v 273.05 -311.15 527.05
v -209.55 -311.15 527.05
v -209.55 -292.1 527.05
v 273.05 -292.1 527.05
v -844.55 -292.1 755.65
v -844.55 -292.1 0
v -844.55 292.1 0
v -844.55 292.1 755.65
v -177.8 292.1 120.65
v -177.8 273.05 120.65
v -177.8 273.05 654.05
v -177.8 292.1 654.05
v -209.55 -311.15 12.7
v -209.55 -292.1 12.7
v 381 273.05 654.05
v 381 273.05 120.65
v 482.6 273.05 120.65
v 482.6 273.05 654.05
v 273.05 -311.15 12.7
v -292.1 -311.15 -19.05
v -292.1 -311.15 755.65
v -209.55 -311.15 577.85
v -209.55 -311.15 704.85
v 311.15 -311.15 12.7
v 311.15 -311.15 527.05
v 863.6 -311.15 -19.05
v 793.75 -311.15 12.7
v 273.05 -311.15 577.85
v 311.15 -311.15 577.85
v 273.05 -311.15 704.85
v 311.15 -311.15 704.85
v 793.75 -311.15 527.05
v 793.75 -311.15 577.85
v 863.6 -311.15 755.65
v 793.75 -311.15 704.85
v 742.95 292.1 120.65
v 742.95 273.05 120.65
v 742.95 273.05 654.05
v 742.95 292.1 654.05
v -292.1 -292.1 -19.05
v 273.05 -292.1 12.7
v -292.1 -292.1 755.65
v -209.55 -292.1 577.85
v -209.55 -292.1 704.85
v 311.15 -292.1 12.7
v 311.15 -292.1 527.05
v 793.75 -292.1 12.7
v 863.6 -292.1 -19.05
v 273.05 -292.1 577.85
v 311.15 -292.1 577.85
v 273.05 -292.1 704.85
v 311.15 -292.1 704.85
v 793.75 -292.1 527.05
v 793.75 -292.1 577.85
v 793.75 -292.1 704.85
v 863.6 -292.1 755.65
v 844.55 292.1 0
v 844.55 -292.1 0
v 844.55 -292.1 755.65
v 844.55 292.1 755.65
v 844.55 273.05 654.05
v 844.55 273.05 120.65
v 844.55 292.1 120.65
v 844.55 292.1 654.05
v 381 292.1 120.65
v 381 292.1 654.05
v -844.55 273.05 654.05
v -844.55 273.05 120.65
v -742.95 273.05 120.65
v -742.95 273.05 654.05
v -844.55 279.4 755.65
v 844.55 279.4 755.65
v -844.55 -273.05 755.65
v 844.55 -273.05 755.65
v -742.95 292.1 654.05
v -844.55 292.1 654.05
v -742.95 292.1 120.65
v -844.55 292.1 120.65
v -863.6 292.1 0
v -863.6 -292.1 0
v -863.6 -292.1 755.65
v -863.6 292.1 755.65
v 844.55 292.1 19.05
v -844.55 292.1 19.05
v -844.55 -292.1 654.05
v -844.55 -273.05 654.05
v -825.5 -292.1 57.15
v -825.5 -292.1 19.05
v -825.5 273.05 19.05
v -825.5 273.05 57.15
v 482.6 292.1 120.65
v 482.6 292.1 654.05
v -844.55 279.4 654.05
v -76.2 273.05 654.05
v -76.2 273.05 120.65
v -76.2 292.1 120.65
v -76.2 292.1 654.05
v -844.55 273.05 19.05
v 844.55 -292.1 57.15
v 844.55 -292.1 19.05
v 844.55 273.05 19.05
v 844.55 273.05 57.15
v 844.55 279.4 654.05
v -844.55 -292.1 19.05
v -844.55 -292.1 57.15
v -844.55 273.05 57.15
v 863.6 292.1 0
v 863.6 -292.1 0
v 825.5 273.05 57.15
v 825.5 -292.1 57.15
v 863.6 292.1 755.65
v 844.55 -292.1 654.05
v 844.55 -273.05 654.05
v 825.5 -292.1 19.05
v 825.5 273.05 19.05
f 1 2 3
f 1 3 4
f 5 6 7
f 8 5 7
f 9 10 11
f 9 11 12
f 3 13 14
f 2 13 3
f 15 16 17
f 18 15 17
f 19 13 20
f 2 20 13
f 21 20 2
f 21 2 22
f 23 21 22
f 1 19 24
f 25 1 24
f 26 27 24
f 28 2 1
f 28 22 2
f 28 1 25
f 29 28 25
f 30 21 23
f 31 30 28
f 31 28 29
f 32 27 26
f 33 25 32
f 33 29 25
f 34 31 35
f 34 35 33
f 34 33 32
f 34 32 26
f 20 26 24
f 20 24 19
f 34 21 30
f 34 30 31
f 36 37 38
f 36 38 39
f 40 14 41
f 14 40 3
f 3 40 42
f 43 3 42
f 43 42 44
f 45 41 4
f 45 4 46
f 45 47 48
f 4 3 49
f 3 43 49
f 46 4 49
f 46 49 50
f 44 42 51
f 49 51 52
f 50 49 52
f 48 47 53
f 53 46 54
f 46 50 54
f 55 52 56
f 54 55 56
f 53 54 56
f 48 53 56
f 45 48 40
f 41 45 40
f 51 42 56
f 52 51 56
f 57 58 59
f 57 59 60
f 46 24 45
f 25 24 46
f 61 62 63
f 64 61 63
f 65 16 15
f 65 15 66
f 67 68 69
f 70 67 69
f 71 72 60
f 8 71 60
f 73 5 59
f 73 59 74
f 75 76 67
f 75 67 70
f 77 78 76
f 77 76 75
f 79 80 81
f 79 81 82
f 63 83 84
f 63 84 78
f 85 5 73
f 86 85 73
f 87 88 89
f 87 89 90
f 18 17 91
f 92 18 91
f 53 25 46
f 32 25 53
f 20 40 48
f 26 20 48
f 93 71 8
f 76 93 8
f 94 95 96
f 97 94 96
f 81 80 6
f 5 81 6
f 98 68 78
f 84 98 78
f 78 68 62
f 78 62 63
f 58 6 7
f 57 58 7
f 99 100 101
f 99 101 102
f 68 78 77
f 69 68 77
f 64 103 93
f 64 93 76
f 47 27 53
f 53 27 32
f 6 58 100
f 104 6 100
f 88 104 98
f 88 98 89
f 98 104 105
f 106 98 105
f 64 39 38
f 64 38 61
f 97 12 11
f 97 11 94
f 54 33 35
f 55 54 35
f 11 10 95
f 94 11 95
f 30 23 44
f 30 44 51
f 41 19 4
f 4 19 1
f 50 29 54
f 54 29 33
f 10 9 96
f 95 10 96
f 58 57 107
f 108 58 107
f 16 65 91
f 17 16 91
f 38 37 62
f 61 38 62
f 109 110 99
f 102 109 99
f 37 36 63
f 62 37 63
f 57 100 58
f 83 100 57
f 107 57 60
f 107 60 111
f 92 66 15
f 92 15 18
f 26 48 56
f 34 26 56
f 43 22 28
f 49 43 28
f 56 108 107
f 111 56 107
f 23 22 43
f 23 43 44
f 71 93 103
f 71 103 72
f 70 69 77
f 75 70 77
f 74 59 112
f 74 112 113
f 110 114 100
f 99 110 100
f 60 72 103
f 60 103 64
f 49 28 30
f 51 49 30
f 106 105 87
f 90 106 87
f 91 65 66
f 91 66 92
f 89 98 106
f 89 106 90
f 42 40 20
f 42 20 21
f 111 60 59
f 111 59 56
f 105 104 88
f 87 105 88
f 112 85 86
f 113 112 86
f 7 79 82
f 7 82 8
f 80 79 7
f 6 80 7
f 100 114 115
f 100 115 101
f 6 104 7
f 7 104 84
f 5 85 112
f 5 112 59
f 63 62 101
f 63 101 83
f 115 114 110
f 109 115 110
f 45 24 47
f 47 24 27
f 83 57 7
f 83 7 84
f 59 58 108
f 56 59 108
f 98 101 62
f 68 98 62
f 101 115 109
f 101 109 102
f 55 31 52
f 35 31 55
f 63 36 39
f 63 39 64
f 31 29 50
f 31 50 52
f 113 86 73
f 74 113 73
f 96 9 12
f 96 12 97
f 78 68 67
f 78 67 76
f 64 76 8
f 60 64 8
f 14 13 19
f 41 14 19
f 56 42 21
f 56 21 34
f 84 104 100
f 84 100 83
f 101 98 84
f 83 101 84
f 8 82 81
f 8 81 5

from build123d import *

# Parameters (mm, degrees)
F0_W      = 19.05
F0_H      = 584.2
F1_DEPTH  = 755.65
F2_W      = 584.2
F2_H      = 19.05
F3_DEPTH  = 1689.1
F4_W      = 19.05
F4_H      = 38.1
F5_DEPTH  = 565.15
F6_W      = 19.05
F6_H      = 101.6
F6_W_2    = 12.7
F7_DEPTH  = 1689.1
F8_W      = 101.6
F8_H      = 19.05
F9_DEPTH  = 533.4
F10_W     = 1155.7
F10_H     = 774.7
F11_DEPTH = 19.05
F12_W     = 482.6
F12_H     = 127
F12_H_2   = 514.35
F13_DEPTH = 19.05


with BuildPart() as f1:
    # F0 (on Top) → F1 (new body)
    with BuildSketch(Plane.XY):
        with Locations((-854.075, 0)):
            Rectangle(F0_W, F0_H)
        with Locations((854.075, 0)):
            Rectangle(F0_W, F0_H)
    extrude(amount=F1_DEPTH)


with BuildPart() as f3:
    # F2 (on face) → F3 (new body)
    with BuildSketch(Plane.YZ.offset(-844.55)):
        with Locations((0, 9.525)):
            Rectangle(F2_W, F2_H)
    extrude(amount=F3_DEPTH)


with BuildPart() as f5:
    # F4 (on face) → F5 (new body)
    with BuildSketch(Plane.XZ.offset(292.1)):
        with Locations((-835.025, 38.1)):
            Rectangle(F4_W, F4_H)
        with Locations((835.025, 38.1)):
            Rectangle(F4_W, F4_H)
    extrude(amount=-F5_DEPTH)


with BuildPart() as f7:
    # F6 (on face) → F7 (new body)
    with BuildSketch(Plane.YZ.offset(-844.55)):
        with Locations((-282.575, 704.85)):
            Rectangle(F6_W, F6_H)
        with Locations((285.75, 704.85)):
            Rectangle(F6_W_2, F6_H)
        with Locations((282.575, 69.85)):
            Rectangle(F6_W, F6_H)
    extrude(amount=F7_DEPTH)


with BuildPart() as f9:
    # F8 (on face) → F9 (new body)
    with BuildSketch(Plane.XY.offset(120.65)):
        with Locations((-793.75, 282.575)):
            Rectangle(F8_W, F8_H)
        with Locations((431.8, 282.575)):
            Rectangle(F8_W, F8_H)
        with Locations((-127, 282.575)):
            Rectangle(F8_W, F8_H)
        with Locations((793.75, 282.575)):
            Rectangle(F8_W, F8_H)
    extrude(amount=F9_DEPTH)


with BuildPart() as f11:
    # F10 (on face) → F11 (new body)
    with BuildSketch(Plane.XZ.offset(292.1)):
        with Locations((285.75, 368.3)):
            Rectangle(F10_W, F10_H)
    extrude(amount=F11_DEPTH)

    # F12 (on face) → F13 (cut)
    with BuildSketch(Plane.XZ.offset(311.15)):
        with Locations((552.45, 641.35)):
            Rectangle(F12_W, F12_H)
        with Locations((31.75, 269.875)):
            Rectangle(F12_W, F12_H_2)
        with Locations((552.45, 269.875)):
            Rectangle(F12_W, F12_H_2)
        with Locations((31.75, 641.35)):
            Rectangle(F12_W, F12_H)
    extrude(amount=-F13_DEPTH, mode=Mode.SUBTRACT)


solid = Compound([f1.part, f3.part, f5.part, f7.part, f9.part, f11.part])
